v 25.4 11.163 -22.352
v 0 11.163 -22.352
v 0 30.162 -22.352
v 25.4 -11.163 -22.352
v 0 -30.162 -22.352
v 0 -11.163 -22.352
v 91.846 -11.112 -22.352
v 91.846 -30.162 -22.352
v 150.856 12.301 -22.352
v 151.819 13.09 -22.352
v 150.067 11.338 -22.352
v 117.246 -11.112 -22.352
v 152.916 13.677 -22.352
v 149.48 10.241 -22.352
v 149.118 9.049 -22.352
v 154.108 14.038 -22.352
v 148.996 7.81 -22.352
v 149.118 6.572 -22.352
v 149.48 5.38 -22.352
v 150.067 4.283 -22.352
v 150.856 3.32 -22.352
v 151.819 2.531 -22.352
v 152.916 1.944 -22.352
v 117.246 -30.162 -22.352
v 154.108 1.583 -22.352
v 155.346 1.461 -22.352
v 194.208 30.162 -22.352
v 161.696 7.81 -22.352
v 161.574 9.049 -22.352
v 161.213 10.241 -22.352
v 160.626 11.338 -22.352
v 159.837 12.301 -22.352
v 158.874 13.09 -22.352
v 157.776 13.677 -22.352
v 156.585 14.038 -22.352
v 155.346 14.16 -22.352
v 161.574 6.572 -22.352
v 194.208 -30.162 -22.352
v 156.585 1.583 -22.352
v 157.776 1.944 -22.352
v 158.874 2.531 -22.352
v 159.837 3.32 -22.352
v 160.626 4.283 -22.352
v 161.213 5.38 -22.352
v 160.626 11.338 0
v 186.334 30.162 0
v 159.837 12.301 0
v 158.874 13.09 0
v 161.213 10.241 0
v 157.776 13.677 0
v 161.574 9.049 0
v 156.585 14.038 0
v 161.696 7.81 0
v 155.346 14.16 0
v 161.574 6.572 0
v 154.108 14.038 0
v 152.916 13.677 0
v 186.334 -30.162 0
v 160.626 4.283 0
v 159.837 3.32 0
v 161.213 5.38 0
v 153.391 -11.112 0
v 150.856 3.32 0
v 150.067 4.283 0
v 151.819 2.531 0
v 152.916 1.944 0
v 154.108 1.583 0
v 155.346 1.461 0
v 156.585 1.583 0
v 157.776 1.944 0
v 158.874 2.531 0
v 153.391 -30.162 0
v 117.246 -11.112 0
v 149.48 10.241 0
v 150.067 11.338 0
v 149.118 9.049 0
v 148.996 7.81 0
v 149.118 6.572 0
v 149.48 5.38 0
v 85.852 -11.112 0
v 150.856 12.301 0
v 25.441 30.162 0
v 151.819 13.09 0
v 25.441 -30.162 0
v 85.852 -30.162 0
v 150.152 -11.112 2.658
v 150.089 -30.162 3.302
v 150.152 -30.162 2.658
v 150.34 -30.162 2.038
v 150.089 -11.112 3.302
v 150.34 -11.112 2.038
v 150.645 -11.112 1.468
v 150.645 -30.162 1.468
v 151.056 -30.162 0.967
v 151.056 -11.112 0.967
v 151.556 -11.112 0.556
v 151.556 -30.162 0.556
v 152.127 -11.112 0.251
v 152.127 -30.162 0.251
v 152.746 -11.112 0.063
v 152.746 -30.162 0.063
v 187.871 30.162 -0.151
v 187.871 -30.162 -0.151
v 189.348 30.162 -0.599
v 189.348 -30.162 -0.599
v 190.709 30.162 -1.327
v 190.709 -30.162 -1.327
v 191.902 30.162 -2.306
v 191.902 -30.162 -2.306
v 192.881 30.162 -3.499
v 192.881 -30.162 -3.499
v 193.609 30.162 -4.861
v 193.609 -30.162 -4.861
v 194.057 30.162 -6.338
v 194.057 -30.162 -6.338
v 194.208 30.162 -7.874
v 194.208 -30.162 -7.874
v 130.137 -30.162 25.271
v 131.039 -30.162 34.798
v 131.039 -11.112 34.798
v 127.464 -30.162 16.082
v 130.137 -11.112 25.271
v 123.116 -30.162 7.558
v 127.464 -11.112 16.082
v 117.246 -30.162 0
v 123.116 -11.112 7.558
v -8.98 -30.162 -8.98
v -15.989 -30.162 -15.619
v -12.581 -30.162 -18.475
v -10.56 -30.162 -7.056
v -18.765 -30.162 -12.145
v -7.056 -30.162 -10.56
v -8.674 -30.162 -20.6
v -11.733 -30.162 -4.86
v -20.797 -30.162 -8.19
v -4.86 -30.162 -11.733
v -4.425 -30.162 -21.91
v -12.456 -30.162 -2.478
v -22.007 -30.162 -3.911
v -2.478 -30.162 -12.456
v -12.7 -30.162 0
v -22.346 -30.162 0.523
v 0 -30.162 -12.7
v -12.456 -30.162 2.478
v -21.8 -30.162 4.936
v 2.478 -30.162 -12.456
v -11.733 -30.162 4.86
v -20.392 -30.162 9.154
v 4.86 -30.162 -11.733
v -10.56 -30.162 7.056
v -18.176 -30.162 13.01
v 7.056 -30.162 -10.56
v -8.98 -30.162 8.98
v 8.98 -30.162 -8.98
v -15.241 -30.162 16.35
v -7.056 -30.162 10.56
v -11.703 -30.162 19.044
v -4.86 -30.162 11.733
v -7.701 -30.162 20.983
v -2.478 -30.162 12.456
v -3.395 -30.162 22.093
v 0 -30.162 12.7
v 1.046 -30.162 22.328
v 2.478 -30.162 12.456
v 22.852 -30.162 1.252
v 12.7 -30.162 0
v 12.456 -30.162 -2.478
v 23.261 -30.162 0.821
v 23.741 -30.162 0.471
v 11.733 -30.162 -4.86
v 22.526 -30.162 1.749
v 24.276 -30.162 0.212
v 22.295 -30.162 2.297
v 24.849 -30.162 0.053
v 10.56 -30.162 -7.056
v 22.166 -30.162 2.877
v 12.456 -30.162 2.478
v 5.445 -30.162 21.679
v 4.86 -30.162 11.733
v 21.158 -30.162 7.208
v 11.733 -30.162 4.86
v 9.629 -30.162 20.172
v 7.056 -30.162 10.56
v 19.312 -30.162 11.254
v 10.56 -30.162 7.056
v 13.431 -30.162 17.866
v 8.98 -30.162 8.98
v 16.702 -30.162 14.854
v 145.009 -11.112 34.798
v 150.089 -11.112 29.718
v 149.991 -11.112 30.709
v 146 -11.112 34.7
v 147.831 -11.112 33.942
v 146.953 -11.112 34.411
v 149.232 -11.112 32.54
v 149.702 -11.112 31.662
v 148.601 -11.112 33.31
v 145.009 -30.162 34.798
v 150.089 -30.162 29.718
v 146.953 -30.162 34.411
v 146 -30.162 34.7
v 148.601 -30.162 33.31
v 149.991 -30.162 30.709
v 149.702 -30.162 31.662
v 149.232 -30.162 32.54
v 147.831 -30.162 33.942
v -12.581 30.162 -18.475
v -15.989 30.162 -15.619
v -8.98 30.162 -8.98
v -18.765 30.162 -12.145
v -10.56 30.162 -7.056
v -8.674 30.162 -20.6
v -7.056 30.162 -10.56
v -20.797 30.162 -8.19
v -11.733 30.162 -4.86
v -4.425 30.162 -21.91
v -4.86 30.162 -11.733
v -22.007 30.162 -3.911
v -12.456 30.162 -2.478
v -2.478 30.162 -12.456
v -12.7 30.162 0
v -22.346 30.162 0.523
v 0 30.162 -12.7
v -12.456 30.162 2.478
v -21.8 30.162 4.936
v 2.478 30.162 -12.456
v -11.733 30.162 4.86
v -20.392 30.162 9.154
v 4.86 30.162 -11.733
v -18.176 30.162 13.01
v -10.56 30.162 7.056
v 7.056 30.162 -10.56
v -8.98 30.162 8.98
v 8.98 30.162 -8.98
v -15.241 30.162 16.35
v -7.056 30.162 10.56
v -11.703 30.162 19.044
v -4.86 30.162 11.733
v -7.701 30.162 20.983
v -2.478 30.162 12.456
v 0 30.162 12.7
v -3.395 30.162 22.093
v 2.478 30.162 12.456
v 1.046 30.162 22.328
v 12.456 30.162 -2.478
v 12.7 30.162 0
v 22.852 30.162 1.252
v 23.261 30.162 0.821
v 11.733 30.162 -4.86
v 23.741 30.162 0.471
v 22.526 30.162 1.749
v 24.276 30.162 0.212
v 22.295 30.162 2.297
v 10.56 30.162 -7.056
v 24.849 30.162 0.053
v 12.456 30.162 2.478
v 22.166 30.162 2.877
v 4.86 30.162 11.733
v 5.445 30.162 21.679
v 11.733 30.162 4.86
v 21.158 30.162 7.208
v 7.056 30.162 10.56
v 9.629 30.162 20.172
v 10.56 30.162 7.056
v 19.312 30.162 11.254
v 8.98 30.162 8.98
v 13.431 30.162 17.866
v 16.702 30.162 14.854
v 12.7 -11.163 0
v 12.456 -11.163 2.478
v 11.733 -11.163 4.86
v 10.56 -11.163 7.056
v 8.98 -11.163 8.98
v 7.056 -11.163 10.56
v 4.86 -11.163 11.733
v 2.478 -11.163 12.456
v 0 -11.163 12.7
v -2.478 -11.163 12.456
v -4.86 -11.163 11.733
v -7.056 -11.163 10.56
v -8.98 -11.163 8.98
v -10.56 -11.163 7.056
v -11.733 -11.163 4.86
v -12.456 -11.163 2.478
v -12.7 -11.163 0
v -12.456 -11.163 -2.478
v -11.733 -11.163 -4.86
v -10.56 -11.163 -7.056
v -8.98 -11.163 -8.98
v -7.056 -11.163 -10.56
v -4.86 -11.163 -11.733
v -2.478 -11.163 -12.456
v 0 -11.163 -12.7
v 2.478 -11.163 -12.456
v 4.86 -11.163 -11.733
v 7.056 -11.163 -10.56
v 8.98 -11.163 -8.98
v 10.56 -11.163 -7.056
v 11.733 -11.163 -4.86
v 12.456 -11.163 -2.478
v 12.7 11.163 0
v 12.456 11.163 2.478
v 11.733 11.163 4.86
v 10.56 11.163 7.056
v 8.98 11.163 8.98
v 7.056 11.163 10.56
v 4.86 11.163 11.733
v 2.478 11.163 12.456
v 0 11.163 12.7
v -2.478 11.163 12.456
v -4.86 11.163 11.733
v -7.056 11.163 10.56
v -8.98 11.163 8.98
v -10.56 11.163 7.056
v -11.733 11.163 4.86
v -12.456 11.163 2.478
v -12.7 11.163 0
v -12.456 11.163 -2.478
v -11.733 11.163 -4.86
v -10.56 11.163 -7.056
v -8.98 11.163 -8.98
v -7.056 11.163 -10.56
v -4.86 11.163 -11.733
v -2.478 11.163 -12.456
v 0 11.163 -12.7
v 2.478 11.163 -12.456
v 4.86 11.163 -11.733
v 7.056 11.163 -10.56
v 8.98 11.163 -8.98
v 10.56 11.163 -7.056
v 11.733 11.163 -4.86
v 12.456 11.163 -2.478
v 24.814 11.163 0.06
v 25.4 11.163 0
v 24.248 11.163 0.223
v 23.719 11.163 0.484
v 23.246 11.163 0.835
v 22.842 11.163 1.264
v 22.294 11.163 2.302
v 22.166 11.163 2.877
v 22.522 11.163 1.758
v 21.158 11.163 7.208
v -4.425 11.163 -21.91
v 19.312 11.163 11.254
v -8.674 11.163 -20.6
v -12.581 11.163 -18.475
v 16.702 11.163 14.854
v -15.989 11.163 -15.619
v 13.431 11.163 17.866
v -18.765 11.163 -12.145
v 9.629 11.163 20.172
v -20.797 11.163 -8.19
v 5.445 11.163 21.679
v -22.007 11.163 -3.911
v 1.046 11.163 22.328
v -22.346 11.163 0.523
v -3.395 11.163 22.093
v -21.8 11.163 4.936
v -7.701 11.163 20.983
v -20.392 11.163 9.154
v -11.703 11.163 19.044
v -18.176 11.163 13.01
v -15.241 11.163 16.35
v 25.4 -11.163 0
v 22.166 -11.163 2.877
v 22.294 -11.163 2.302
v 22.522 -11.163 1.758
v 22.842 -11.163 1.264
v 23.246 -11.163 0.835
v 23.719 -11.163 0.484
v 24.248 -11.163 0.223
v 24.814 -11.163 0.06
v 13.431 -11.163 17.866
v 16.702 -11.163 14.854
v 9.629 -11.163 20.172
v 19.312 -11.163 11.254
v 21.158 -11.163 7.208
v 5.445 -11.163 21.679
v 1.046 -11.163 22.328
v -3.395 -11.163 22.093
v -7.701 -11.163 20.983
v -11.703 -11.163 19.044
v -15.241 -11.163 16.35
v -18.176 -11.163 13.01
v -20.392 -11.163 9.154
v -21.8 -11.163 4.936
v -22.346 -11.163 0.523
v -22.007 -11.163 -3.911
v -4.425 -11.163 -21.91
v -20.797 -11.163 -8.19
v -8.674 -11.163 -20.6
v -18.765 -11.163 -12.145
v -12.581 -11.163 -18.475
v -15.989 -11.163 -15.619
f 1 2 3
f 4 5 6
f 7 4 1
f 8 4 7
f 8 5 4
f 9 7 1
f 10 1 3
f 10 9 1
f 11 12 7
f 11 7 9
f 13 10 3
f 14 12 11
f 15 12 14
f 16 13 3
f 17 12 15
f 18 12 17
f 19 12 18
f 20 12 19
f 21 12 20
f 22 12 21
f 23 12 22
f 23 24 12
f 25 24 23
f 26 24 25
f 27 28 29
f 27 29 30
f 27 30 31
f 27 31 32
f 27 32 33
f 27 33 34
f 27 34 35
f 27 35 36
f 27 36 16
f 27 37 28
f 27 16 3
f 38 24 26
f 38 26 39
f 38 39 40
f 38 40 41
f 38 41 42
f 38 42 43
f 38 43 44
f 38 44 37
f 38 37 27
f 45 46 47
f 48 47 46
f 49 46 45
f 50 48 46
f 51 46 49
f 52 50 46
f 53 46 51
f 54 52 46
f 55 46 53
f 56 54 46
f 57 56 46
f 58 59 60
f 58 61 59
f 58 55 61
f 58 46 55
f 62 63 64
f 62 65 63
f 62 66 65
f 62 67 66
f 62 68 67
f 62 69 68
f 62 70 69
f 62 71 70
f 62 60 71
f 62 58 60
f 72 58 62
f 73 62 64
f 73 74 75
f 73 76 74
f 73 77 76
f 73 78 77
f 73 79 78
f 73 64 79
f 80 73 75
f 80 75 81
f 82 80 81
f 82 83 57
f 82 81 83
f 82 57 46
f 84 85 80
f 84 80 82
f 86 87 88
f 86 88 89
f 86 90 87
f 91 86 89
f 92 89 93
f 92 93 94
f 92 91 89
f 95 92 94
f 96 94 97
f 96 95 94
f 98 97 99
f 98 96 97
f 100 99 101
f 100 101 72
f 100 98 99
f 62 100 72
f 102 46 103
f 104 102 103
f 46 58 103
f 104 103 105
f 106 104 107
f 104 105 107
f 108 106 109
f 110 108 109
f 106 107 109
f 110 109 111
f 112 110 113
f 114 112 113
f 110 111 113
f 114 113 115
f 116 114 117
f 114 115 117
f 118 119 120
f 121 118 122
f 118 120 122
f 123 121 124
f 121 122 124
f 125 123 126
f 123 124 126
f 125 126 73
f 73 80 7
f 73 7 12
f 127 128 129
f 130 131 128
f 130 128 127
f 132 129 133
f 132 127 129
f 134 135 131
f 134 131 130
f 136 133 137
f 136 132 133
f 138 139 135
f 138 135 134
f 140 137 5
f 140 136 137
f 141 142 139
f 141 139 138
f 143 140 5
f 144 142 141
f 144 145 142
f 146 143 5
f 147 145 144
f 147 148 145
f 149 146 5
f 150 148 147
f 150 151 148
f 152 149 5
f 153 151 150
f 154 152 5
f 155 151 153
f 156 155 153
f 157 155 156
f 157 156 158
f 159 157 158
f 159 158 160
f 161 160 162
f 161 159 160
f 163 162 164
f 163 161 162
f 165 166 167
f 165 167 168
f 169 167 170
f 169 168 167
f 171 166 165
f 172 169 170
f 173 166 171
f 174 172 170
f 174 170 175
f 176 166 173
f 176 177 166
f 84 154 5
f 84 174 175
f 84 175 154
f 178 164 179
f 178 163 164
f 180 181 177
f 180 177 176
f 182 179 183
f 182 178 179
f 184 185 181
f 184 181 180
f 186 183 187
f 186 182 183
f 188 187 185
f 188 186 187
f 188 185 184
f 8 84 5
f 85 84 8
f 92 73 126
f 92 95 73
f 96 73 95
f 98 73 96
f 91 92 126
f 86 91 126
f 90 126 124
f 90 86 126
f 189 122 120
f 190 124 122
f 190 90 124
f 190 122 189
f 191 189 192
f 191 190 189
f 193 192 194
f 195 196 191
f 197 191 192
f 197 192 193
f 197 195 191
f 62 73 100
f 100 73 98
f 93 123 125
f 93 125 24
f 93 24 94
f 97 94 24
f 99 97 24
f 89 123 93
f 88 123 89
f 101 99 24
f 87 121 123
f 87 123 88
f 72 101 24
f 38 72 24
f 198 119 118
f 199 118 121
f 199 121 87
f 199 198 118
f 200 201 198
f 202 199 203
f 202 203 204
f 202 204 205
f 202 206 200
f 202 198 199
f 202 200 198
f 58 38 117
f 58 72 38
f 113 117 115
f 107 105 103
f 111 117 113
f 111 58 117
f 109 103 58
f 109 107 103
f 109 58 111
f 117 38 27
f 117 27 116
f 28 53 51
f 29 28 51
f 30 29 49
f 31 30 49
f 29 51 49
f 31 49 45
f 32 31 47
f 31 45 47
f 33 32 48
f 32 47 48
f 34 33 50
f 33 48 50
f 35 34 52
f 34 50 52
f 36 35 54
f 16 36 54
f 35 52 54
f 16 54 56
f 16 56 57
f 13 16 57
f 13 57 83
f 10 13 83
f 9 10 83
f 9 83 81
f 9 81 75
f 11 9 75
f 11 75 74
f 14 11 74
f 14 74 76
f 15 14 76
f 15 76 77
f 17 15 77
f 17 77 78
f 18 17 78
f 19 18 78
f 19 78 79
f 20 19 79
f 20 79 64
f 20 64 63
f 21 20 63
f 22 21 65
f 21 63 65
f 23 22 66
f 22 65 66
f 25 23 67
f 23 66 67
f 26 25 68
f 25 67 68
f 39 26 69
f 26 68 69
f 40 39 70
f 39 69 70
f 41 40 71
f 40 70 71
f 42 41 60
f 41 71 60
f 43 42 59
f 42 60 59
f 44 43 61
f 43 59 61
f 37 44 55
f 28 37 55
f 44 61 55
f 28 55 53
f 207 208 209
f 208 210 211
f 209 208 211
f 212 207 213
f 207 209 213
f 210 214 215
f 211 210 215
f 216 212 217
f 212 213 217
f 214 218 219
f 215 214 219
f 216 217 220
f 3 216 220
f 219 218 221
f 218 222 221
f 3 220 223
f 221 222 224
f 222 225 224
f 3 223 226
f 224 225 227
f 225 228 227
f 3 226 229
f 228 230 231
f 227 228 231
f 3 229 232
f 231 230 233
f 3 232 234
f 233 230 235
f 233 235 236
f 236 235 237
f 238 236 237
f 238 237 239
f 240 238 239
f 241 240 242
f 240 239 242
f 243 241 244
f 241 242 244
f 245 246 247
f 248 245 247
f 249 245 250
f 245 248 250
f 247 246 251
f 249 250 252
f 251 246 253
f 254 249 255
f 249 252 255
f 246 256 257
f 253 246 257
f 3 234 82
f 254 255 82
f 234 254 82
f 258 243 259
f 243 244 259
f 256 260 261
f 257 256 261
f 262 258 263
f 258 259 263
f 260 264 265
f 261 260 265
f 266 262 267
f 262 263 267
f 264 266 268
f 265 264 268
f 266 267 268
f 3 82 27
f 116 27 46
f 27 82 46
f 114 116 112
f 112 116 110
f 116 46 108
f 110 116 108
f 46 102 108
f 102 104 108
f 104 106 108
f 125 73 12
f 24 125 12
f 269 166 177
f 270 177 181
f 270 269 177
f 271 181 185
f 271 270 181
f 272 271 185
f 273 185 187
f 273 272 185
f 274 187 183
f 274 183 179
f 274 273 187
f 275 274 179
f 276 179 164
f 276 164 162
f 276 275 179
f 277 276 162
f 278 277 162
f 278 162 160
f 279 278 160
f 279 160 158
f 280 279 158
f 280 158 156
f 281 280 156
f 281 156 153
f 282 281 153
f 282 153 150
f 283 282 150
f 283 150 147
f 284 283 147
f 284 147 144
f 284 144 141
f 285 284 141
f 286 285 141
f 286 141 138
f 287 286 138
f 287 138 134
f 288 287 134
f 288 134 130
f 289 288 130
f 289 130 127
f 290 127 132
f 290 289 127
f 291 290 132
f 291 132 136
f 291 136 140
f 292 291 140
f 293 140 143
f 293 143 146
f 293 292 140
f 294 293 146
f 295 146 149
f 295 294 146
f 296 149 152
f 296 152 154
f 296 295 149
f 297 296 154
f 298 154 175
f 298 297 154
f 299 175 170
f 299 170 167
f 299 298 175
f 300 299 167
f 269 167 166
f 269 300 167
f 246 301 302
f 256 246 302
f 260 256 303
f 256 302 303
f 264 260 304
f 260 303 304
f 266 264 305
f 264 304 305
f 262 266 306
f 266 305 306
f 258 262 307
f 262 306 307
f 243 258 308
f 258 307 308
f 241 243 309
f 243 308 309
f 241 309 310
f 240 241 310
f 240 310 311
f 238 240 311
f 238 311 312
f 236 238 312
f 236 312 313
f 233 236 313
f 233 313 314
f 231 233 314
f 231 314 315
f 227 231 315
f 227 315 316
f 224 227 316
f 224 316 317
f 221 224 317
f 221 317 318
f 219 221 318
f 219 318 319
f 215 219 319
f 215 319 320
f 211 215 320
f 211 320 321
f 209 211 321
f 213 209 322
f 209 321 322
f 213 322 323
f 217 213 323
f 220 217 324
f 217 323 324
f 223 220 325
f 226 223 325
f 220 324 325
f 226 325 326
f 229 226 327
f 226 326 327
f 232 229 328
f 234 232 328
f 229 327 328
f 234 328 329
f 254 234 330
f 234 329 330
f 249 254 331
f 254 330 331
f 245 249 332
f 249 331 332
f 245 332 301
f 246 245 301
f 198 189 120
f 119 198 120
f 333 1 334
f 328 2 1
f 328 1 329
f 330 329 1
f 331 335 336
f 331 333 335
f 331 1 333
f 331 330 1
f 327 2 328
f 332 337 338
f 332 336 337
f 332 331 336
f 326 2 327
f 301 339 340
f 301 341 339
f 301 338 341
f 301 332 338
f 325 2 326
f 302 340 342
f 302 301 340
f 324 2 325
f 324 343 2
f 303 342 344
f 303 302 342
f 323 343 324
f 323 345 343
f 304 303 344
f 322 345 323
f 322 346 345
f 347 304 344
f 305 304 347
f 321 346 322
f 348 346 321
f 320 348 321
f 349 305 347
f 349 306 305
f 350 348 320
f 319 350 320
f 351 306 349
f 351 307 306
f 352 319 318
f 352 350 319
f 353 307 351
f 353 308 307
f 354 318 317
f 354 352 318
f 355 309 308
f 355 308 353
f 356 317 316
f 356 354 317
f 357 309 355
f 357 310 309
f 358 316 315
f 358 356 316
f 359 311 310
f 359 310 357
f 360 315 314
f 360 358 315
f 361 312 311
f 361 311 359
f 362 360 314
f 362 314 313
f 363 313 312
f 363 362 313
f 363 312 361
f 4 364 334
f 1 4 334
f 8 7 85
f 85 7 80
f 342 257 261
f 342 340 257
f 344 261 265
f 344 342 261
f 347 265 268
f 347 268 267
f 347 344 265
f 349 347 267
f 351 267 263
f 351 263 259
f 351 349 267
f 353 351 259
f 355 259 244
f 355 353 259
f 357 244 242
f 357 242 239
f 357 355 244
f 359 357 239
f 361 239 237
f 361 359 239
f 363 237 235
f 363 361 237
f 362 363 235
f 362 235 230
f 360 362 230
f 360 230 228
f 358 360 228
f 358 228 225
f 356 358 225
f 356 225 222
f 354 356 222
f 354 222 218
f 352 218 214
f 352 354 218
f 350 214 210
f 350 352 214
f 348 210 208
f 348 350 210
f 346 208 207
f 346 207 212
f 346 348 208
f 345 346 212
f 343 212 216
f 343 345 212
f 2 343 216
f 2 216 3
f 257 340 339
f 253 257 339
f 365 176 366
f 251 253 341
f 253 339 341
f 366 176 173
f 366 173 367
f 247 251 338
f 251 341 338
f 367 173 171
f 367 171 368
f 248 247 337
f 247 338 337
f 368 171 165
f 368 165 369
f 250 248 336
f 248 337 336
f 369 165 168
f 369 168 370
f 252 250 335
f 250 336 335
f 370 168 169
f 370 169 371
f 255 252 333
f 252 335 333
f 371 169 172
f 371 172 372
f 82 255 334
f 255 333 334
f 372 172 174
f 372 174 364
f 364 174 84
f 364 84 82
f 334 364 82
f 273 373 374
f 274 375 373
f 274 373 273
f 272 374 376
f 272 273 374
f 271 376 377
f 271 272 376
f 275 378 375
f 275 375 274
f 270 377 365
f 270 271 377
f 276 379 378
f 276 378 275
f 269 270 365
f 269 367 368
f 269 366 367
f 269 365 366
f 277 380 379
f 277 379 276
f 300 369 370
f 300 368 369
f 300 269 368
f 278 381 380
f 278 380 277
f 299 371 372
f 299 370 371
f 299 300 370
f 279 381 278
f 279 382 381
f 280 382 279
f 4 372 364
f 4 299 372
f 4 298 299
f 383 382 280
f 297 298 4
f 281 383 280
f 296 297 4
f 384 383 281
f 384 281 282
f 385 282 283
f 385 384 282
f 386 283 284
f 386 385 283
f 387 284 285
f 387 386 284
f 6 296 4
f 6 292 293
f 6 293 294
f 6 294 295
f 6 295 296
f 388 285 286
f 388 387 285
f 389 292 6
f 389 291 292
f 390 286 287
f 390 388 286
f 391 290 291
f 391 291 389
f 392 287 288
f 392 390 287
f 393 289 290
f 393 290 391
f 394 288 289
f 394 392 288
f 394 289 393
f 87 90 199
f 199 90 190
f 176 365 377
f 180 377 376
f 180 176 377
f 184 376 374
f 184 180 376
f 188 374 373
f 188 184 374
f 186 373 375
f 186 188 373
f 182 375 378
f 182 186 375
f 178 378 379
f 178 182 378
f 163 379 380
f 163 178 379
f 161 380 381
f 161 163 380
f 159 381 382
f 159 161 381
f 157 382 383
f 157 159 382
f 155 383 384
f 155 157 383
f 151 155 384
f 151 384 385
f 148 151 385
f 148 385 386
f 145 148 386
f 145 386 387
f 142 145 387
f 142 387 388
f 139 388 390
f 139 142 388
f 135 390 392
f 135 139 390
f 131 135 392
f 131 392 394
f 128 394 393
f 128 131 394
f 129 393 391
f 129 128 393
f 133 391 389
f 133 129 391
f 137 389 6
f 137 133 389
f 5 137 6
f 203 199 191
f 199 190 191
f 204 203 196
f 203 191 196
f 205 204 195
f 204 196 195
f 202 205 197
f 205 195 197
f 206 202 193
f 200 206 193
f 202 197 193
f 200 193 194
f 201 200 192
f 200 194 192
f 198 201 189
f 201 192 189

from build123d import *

# Parameters (mm, degrees)
F1_DEPTH      = 30.1625
F1_DEPTH_BACK = 30.1625
F2_DEPTH      = 11.1125
F2_DEPTH_BACK = 30.1625
F0_R          = 12.7
F3_DEPTH      = 30.1625
F3_DEPTH_BACK = 30.1625
F4_W          = 41.275
F4_H          = 34.798
F5_DEPTH      = 38.1
F6_W          = 11.1633
F6_H          = 50.8
F7_DEPTH      = 25.4
F7_DEPTH_BACK = 25.4
F8_R          = 6.35
F9_DEPTH      = 25.4
F10_R         = 7.874
F11_R         = 5.08
F12_F1_R      = 3.302
F12_F2_R      = 3.302


with BuildPart() as f1:
    # F0 (on Front) → F1 (new body, two sides)
    with BuildSketch(Plane.XZ) as f1_sk:
        with BuildLine():
            ThreePointArc((131.0386, 34.798), (127.4644153616, 16.0823576341), (117.2464, 0))
            Line((117.2464, 0), (117.2464, -22.352))
            Line((117.2464, -22.352), (194.2084, -22.352))
            Line((194.2084, -22.352), (194.2084, 0))
            Line((194.2084, 0), (150.0886, 0))
            Line((150.0886, 0), (150.0886, 34.798))
            Line((150.0886, 34.798), (131.0386, 34.798))
        make_face()
    extrude(amount=-F1_DEPTH)
    extrude(f1_sk.sketch, amount=F1_DEPTH_BACK)

    # F0 (on Front) → F2 (join, two sides)
    with BuildSketch(Plane.XZ) as f2_sk:
        Polygon((117.2464, 0), (85.852, 0), (91.8464, -22.352), (117.2464, -22.352), align=None)
    extrude(amount=F2_DEPTH)
    extrude(f2_sk.sketch, amount=-F2_DEPTH_BACK)

    # F0 (on Front) → F3 (join, two sides)
    with BuildSketch(Plane.XZ) as f3_sk:
        with BuildLine():
            Line((85.852, 0), (22.352, 0))
            ThreePointArc((22.352, 0), (15.8052507731, -15.8052507731), (0, -22.352))
            Line((0, -22.352), (91.8464, -22.352))
            Line((91.8464, -22.352), (85.852, 0))
        make_face()
        with BuildLine():
            ThreePointArc((0, -22.352), (15.8052507731, -15.8052507731), (22.352, 0))
            ThreePointArc((22.352, 0), (-15.8052507731, 15.8052507731), (0, -22.352))
        make_face()
        Circle(F0_R, mode=Mode.SUBTRACT)
    extrude(amount=F3_DEPTH)
    extrude(f3_sk.sketch, amount=-F3_DEPTH_BACK)

    # F4 (on face) → F5 (cut)
    with BuildSketch(Plane.YZ.offset(150.0886)):
        with Locations((9.525, 17.399)):
            Rectangle(F4_W, F4_H)
    extrude(amount=-F5_DEPTH, mode=Mode.SUBTRACT)

    # F6 (on Right) → F7 (cut, two sides)
    with BuildSketch(Plane.YZ) as f7_sk:
        with Locations((5.58165, 25.4)):
            Rectangle(F6_W, F6_H)
        with Locations((-5.58165, 25.4)):
            Rectangle(F6_W, F6_H)
        Polygon((11.1633, 0), (0, 0), (-11.1633, 0), (-11.1633, -23.6136056483), (11.1633, -23.6136056483), align=None)
    extrude(amount=-F7_DEPTH, mode=Mode.SUBTRACT)
    extrude(f7_sk.sketch, amount=F7_DEPTH_BACK, mode=Mode.SUBTRACT)

    # F8 (on face) → F9 (cut)
    with BuildSketch(Plane.XY):
        with Locations((155.3464, 7.8105)):
            Circle(F8_R)
    extrude(amount=-F9_DEPTH, mode=Mode.SUBTRACT)

    # F10
    f10_edges = [f1.edges().sort_by_distance(p)[0] for p in [
        (194.2084, 0, 0),
    ]]
    fillet(f10_edges, radius=F10_R)

    # F11
    f11_edges = [f1.edges().sort_by_distance(p)[0] for p in [
        (150.0886, -20.6375, 34.798),
    ]]
    fillet(f11_edges, radius=F11_R)

    # F12: fillet of radius 3.302 on 3 edges, made by hand

    # F12_f1
    f12_f1_edges = [f1.edges().sort_by_distance(p)[0] for p in [
        (150.0886, -20.6375, 0),
    ]]
    fillet(f12_f1_edges, radius=F12_F1_R)

    # F12_f2
    f12_f2_edges = [f1.edges().sort_by_distance(p)[0] for p in [
        (22.352, 20.6629, 0),
    ]]
    fillet(f12_f2_edges, radius=F12_F2_R)


solid = f1.part
